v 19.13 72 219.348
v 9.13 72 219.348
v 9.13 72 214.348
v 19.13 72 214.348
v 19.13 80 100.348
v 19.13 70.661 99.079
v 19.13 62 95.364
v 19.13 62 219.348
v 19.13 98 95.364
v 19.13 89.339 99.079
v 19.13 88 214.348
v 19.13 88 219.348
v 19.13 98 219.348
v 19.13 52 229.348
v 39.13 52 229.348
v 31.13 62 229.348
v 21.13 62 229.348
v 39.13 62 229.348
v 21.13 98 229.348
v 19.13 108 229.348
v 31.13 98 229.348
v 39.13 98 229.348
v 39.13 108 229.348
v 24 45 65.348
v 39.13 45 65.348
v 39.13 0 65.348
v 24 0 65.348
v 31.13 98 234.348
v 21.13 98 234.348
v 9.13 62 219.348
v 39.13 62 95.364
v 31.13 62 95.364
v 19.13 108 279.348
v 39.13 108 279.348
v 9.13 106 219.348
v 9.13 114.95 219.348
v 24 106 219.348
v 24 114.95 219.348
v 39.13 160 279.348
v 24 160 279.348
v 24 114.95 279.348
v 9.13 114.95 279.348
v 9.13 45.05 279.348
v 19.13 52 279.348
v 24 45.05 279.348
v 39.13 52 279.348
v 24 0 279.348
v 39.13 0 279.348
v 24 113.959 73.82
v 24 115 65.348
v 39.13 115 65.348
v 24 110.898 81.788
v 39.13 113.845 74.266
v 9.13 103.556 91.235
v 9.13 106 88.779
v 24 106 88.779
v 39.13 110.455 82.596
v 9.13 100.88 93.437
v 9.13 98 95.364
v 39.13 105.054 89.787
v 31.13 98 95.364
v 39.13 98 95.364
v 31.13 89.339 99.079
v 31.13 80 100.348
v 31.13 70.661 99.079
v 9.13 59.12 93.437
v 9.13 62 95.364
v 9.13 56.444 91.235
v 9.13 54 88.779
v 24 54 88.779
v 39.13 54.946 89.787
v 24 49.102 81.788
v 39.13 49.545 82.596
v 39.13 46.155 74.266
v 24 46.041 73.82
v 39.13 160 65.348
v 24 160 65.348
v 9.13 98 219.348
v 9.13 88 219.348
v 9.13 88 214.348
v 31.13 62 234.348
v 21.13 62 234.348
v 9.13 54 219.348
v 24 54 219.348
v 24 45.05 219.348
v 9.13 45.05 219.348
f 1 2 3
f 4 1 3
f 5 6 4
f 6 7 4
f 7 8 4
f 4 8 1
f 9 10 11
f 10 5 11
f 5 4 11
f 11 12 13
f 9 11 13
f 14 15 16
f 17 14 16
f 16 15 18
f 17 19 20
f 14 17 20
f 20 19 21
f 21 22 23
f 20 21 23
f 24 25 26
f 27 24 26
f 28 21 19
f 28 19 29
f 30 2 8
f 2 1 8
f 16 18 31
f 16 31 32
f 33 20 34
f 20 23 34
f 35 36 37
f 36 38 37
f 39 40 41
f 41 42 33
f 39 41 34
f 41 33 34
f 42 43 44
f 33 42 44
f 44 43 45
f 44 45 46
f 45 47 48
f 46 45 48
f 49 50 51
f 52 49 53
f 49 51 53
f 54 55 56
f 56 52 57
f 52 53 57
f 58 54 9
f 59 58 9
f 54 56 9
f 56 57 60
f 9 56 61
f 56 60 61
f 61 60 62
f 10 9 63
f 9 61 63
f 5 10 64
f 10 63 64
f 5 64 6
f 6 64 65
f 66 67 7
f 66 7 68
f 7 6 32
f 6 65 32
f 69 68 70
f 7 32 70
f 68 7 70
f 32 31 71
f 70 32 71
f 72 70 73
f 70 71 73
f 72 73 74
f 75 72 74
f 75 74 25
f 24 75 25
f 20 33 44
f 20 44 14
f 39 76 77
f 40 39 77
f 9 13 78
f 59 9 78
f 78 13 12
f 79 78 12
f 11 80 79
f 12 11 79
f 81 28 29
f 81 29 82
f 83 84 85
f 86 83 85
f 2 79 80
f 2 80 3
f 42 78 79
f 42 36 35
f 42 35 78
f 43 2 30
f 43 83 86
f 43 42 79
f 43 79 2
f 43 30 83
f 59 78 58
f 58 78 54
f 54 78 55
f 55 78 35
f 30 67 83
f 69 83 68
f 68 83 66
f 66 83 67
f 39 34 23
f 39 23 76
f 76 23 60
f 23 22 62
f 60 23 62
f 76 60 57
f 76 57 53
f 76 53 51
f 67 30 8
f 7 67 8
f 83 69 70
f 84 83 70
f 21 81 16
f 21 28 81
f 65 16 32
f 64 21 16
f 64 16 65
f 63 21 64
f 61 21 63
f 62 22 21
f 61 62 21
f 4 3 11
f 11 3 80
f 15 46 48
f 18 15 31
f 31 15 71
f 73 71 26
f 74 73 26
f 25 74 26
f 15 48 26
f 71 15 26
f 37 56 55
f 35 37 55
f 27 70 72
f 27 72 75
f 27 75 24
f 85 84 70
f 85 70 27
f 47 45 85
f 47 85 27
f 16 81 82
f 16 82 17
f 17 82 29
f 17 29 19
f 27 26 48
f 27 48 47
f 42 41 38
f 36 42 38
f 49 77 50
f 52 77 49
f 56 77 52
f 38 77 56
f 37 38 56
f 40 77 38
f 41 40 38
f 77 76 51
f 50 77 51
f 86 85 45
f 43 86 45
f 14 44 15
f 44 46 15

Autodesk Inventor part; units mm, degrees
ref_plane "YZ Plane" through (0, 0, 0) normal (1, 0, 0) x (0, 1, 0)
ref_plane "XZ Plane" through (0, 0, 0) normal (0, 1, 0) x (-1, 0, 0)
ref_plane "XY Plane" through (0, 0, 0) normal (0, 0, 1) x (1, 0, 0)
sketch "Sketch1" plane through (0, 0, 0) normal (0, 1, 0) x (-1, 0, 0)
  line L0 (0, 279.3478) -> (-39.1304, 279.3478)
  line L1 (-39.1304, 279.3478) -> (-39.1304, -270.6522)
  line L2 (-39.1304, -270.6522) -> (0, -270.6522)
  line L3 (0, -270.6522) -> (0, 279.3478)
  line L4 (-39.1304, 279.3478) -> (-29.1304, 279.3478)
  line L5 (-29.1304, 254.3478) -> (-39.1304, 254.3478)
  line L6 (-39.1304, 254.3478) -> (-39.1304, 279.3478)
  line L7 (-39.1304, -270.6522) -> (-29.1304, -270.6522)
  line L8 (-29.1304, -245.6522) -> (-39.1304, -245.6522)
  line L9 (-39.1304, -245.6522) -> (-39.1304, -270.6522)
  point P0 (0, 0)
  point P1 (-39.1304, 254.3478)
  point P2 (-39.1304, -245.6522)
  dimension "d0" = 550
  dimension "d4" = 25
  dimension "d5" = 25
  dimension "d28" = 39.1304
extrude "Extrusion1" add sketch "Sketch1" along normal blind 160
sketch "Sketch2" plane through (0, 0, 279.3478) normal (0, 0, 1) x (1, 0, 0)
  line L0 (0, 160) -> (39.1304, 160) projected
  line L1 (0, 160) -> (39.1304, 160)
  line L2 (39.1304, 160) -> (39.1304, 0)
  line L3 (39.1304, 0) -> (0, 0)
  line L4 (0, 0) -> (0, 160)
  line L5 (39.1304, 160) -> (39.1304, 160)
  line L6 (39.1304, 160) -> (39.1304, 115)
  line L7 (39.1304, 115) -> (39.1304, 115)
  line L8 (39.1304, 115) -> (39.1304, 160)
  line L9 (39.1304, 0) -> (39.1304, 0)
  line L10 (39.1304, 0) -> (39.1304, 45)
  line L11 (39.1304, 45) -> (39.1304, 45)
  line L12 (39.1304, 45) -> (39.1304, 0)
  circle A0 centre (39.1304, 80) radius 18
  line L13 (31.1304, 75) -> (39.1304, 75)
  line L14 (39.1304, 75) -> (39.1304, 98)
  line L15 (39.1304, 98) -> (31.1304, 98)
  line L16 (31.1304, 98) -> (31.1304, 75)
  line L17 (31.1304, 75) -> (39.1304, 75)
  line L18 (39.1304, 75) -> (39.1304, 62)
  line L19 (39.1304, 62) -> (31.1304, 62)
  line L20 (31.1304, 62) -> (31.1304, 75)
  line L21 (39.1304, 0) -> (39.1304, 160) projected
  line L22 (0, 160) -> (9.1304, 160)
  line L23 (9.1304, 160) -> (9.1304, 0)
  line L24 (9.1304, 0) -> (0, 0)
  line L25 (0, 0) -> (0, 160)
  line L26 (19.1304, 98) -> (-11, 98)
  line L27 (-11, 98) -> (-11, 62)
  line L28 (-11, 62) -> (19.1304, 62)
  line L29 (19.1304, 62) -> (19.1304, 98)
  line L30 (-8, 54) -> (24, 54)
  line L31 (24, 54) -> (24, 0)
  line L32 (24, 0) -> (-8, 0)
  line L33 (-8, 0) -> (-8, 54)
  line L34 (-8, 160) -> (24, 160)
  line L35 (24, 160) -> (24, 106)
  line L36 (24, 106) -> (-8, 106)
  line L37 (-8, 106) -> (-8, 160)
  point P0 (0, 0)
  point P1 (39.1304, 115)
  point P2 (39.1304, 160)
  point P3 (39.1304, 45)
  point P4 (39.1304, 0)
  point P5 (39.1304, 115)
  point P6 (0, 98)
  point P7 (0, 62)
  point P8 (9.1304, 98)
  point P9 (9.1304, 106)
  point P10 (9.1304, 54)
  point P11 (9.1304, 62)
  dimension "d6" = 0
  dimension "d7" = 45
  dimension "d8" = 45
  dimension "d9" = 8
  dimension "d10" = 36
  dimension "d11" = 80
  dimension "d12" = 80
  dimension "d15" = 30
  dimension "d34" = 12
extrude "Extrusion2" cut sketch "Sketch2" against normal up to surface (550 mm away) contours L0 L23 L36 L4 | L0 L35 L36 L23 | L36 L23 L26 L4 | L26 L23 L28 L4 | L26 L29 L28 L23 | L28 L23 L30 L4 | L30 L23 L3 L4 | L2 L13 L16 A0 | A0 L16 L15 | L30 L31 L3 L23 | L2 A0 L20 L13 | L19 L20 A0
sketch "Sketch5" plane through (39.1304, 160, 279.3478) normal (1, 0, 0) x (0, 0, -1)
  line L0 (0, -62) -> (0, 0) projected
  line L1 (0, -160) -> (550, -160) projected
  line L2 (0, 0) -> (214, 0)
  line L3 (214, 0) -> (214, -160)
  line L4 (214, -160) -> (0, -160)
  line L5 (0, -160) -> (0, 0)
  circle A0 centre (214, -80) radius 35
  line L6 (214, 0) -> (550, 0)
  line L7 (550, 0) -> (550, -160)
  line L8 (550, -160) -> (214, -160)
  line L9 (214, -160) -> (214, 0)
  point P0 (279.3478, -160)
  point P1 (214, -45)
  point P2 (214, -115)
  dimension "d30" = 160
  dimension "d31" = 70
extrude "Extrusion4" cut sketch "Sketch5" against normal blind 100 contours L6 L7 L1 L3 A0 | A0 L3 | L3 A0
sketch "Sketch6" plane through (19.1304, 62, 279.3478) normal (-1, 0, 0) x (0, 0, 1)
  line L0 (0, 52.95) -> (-60, 52.95)
  line L1 (-60, 52.95) -> (-60, -16.95)
  line L2 (-60, -16.95) -> (0, -16.95)
  line L3 (0, -16.95) -> (0, 52.95)
  line L4 (0, -62) -> (-214, -62) projected
  line L5 (-214, 98) -> (0, 98) projected
  point P0 (-279.3478, -62)
  dimension "d43" = 45.05
  dimension "d44" = 45.05
  dimension "d45" = 60
extrude "Extrusion5" add sketch "Sketch6" along normal mid plane 20
sketch "Sketch7" plane through (24, 0, 279.3478) normal (0, 0, 1) x (1, 0, 0)
  point P0 (-24, 0)
sketch "Sketch8" plane through (39.1304, 0, 279.3478) normal (1, 0, 0) x (0, 0, -1)
  line L0 (0, 0) -> (0, 62) projected
  line L1 (0, 52) -> (50, 52)
  line L2 (50, 52) -> (50, 108)
  line L3 (50, 108) -> (0, 108)
  line L4 (0, 108) -> (0, 52)
  line L5 (183.9833, 62) -> (0, 62) projected
  line L6 (0, 98) -> (183.9833, 98) projected
  point P0 (279.3478, 0)
  dimension "d38" = 10
  dimension "d39" = 10
  dimension "d40" = 50
extrude "Extrusion6" cut sketch "Sketch8" against normal blind 20
sketch "Sketch9" plane through (31.1304, 80, 65.3478) normal (1, 0, 0) x (0, 0, -1)
  line L0 (-164, 18) -> (-164, -18) projected
  line L1 (-154, -18) -> (-30.0167, -18) projected
  line L2 (-164, 18) -> (-169, 18)
  line L3 (-169, 18) -> (-169, -18)
  line L4 (-169, -18) -> (-164, -18)
  line L5 (-164, -18) -> (-164, 18)
  point P0 (65.3478, -80)
  point P1 (-214, -18)
extrude "Extrusion7" add sketch "Sketch9" against normal blind 10
sketch "Sketch10" plane through (9.1304, 45.05, 279.3478) normal (-1, 0, 0) x (0, 0, 1)
  line L0 (-60, 52.95) -> (-60, 16.95) projected
  line L1 (-60, 26.95) -> (-65, 26.95)
  line L2 (-65, 26.95) -> (-65, 42.95)
  line L3 (-65, 42.95) -> (-60, 42.95)
  line L4 (-60, 42.95) -> (-60, 26.95)
  line L5 (-60, 16.95) -> (-183.9833, 16.95) projected
  line L6 (-60, 52.95) -> (-183.9833, 52.95) projected
  point P0 (-279.3478, -45.05)
  point P1 (-60, 42.95)
  dimension "d48" = 10
  dimension "d49" = 10
extrude "Extrusion8" add sketch "Sketch10" against normal blind 10
properties part number "MainRails" material "Aluminum 6061"
